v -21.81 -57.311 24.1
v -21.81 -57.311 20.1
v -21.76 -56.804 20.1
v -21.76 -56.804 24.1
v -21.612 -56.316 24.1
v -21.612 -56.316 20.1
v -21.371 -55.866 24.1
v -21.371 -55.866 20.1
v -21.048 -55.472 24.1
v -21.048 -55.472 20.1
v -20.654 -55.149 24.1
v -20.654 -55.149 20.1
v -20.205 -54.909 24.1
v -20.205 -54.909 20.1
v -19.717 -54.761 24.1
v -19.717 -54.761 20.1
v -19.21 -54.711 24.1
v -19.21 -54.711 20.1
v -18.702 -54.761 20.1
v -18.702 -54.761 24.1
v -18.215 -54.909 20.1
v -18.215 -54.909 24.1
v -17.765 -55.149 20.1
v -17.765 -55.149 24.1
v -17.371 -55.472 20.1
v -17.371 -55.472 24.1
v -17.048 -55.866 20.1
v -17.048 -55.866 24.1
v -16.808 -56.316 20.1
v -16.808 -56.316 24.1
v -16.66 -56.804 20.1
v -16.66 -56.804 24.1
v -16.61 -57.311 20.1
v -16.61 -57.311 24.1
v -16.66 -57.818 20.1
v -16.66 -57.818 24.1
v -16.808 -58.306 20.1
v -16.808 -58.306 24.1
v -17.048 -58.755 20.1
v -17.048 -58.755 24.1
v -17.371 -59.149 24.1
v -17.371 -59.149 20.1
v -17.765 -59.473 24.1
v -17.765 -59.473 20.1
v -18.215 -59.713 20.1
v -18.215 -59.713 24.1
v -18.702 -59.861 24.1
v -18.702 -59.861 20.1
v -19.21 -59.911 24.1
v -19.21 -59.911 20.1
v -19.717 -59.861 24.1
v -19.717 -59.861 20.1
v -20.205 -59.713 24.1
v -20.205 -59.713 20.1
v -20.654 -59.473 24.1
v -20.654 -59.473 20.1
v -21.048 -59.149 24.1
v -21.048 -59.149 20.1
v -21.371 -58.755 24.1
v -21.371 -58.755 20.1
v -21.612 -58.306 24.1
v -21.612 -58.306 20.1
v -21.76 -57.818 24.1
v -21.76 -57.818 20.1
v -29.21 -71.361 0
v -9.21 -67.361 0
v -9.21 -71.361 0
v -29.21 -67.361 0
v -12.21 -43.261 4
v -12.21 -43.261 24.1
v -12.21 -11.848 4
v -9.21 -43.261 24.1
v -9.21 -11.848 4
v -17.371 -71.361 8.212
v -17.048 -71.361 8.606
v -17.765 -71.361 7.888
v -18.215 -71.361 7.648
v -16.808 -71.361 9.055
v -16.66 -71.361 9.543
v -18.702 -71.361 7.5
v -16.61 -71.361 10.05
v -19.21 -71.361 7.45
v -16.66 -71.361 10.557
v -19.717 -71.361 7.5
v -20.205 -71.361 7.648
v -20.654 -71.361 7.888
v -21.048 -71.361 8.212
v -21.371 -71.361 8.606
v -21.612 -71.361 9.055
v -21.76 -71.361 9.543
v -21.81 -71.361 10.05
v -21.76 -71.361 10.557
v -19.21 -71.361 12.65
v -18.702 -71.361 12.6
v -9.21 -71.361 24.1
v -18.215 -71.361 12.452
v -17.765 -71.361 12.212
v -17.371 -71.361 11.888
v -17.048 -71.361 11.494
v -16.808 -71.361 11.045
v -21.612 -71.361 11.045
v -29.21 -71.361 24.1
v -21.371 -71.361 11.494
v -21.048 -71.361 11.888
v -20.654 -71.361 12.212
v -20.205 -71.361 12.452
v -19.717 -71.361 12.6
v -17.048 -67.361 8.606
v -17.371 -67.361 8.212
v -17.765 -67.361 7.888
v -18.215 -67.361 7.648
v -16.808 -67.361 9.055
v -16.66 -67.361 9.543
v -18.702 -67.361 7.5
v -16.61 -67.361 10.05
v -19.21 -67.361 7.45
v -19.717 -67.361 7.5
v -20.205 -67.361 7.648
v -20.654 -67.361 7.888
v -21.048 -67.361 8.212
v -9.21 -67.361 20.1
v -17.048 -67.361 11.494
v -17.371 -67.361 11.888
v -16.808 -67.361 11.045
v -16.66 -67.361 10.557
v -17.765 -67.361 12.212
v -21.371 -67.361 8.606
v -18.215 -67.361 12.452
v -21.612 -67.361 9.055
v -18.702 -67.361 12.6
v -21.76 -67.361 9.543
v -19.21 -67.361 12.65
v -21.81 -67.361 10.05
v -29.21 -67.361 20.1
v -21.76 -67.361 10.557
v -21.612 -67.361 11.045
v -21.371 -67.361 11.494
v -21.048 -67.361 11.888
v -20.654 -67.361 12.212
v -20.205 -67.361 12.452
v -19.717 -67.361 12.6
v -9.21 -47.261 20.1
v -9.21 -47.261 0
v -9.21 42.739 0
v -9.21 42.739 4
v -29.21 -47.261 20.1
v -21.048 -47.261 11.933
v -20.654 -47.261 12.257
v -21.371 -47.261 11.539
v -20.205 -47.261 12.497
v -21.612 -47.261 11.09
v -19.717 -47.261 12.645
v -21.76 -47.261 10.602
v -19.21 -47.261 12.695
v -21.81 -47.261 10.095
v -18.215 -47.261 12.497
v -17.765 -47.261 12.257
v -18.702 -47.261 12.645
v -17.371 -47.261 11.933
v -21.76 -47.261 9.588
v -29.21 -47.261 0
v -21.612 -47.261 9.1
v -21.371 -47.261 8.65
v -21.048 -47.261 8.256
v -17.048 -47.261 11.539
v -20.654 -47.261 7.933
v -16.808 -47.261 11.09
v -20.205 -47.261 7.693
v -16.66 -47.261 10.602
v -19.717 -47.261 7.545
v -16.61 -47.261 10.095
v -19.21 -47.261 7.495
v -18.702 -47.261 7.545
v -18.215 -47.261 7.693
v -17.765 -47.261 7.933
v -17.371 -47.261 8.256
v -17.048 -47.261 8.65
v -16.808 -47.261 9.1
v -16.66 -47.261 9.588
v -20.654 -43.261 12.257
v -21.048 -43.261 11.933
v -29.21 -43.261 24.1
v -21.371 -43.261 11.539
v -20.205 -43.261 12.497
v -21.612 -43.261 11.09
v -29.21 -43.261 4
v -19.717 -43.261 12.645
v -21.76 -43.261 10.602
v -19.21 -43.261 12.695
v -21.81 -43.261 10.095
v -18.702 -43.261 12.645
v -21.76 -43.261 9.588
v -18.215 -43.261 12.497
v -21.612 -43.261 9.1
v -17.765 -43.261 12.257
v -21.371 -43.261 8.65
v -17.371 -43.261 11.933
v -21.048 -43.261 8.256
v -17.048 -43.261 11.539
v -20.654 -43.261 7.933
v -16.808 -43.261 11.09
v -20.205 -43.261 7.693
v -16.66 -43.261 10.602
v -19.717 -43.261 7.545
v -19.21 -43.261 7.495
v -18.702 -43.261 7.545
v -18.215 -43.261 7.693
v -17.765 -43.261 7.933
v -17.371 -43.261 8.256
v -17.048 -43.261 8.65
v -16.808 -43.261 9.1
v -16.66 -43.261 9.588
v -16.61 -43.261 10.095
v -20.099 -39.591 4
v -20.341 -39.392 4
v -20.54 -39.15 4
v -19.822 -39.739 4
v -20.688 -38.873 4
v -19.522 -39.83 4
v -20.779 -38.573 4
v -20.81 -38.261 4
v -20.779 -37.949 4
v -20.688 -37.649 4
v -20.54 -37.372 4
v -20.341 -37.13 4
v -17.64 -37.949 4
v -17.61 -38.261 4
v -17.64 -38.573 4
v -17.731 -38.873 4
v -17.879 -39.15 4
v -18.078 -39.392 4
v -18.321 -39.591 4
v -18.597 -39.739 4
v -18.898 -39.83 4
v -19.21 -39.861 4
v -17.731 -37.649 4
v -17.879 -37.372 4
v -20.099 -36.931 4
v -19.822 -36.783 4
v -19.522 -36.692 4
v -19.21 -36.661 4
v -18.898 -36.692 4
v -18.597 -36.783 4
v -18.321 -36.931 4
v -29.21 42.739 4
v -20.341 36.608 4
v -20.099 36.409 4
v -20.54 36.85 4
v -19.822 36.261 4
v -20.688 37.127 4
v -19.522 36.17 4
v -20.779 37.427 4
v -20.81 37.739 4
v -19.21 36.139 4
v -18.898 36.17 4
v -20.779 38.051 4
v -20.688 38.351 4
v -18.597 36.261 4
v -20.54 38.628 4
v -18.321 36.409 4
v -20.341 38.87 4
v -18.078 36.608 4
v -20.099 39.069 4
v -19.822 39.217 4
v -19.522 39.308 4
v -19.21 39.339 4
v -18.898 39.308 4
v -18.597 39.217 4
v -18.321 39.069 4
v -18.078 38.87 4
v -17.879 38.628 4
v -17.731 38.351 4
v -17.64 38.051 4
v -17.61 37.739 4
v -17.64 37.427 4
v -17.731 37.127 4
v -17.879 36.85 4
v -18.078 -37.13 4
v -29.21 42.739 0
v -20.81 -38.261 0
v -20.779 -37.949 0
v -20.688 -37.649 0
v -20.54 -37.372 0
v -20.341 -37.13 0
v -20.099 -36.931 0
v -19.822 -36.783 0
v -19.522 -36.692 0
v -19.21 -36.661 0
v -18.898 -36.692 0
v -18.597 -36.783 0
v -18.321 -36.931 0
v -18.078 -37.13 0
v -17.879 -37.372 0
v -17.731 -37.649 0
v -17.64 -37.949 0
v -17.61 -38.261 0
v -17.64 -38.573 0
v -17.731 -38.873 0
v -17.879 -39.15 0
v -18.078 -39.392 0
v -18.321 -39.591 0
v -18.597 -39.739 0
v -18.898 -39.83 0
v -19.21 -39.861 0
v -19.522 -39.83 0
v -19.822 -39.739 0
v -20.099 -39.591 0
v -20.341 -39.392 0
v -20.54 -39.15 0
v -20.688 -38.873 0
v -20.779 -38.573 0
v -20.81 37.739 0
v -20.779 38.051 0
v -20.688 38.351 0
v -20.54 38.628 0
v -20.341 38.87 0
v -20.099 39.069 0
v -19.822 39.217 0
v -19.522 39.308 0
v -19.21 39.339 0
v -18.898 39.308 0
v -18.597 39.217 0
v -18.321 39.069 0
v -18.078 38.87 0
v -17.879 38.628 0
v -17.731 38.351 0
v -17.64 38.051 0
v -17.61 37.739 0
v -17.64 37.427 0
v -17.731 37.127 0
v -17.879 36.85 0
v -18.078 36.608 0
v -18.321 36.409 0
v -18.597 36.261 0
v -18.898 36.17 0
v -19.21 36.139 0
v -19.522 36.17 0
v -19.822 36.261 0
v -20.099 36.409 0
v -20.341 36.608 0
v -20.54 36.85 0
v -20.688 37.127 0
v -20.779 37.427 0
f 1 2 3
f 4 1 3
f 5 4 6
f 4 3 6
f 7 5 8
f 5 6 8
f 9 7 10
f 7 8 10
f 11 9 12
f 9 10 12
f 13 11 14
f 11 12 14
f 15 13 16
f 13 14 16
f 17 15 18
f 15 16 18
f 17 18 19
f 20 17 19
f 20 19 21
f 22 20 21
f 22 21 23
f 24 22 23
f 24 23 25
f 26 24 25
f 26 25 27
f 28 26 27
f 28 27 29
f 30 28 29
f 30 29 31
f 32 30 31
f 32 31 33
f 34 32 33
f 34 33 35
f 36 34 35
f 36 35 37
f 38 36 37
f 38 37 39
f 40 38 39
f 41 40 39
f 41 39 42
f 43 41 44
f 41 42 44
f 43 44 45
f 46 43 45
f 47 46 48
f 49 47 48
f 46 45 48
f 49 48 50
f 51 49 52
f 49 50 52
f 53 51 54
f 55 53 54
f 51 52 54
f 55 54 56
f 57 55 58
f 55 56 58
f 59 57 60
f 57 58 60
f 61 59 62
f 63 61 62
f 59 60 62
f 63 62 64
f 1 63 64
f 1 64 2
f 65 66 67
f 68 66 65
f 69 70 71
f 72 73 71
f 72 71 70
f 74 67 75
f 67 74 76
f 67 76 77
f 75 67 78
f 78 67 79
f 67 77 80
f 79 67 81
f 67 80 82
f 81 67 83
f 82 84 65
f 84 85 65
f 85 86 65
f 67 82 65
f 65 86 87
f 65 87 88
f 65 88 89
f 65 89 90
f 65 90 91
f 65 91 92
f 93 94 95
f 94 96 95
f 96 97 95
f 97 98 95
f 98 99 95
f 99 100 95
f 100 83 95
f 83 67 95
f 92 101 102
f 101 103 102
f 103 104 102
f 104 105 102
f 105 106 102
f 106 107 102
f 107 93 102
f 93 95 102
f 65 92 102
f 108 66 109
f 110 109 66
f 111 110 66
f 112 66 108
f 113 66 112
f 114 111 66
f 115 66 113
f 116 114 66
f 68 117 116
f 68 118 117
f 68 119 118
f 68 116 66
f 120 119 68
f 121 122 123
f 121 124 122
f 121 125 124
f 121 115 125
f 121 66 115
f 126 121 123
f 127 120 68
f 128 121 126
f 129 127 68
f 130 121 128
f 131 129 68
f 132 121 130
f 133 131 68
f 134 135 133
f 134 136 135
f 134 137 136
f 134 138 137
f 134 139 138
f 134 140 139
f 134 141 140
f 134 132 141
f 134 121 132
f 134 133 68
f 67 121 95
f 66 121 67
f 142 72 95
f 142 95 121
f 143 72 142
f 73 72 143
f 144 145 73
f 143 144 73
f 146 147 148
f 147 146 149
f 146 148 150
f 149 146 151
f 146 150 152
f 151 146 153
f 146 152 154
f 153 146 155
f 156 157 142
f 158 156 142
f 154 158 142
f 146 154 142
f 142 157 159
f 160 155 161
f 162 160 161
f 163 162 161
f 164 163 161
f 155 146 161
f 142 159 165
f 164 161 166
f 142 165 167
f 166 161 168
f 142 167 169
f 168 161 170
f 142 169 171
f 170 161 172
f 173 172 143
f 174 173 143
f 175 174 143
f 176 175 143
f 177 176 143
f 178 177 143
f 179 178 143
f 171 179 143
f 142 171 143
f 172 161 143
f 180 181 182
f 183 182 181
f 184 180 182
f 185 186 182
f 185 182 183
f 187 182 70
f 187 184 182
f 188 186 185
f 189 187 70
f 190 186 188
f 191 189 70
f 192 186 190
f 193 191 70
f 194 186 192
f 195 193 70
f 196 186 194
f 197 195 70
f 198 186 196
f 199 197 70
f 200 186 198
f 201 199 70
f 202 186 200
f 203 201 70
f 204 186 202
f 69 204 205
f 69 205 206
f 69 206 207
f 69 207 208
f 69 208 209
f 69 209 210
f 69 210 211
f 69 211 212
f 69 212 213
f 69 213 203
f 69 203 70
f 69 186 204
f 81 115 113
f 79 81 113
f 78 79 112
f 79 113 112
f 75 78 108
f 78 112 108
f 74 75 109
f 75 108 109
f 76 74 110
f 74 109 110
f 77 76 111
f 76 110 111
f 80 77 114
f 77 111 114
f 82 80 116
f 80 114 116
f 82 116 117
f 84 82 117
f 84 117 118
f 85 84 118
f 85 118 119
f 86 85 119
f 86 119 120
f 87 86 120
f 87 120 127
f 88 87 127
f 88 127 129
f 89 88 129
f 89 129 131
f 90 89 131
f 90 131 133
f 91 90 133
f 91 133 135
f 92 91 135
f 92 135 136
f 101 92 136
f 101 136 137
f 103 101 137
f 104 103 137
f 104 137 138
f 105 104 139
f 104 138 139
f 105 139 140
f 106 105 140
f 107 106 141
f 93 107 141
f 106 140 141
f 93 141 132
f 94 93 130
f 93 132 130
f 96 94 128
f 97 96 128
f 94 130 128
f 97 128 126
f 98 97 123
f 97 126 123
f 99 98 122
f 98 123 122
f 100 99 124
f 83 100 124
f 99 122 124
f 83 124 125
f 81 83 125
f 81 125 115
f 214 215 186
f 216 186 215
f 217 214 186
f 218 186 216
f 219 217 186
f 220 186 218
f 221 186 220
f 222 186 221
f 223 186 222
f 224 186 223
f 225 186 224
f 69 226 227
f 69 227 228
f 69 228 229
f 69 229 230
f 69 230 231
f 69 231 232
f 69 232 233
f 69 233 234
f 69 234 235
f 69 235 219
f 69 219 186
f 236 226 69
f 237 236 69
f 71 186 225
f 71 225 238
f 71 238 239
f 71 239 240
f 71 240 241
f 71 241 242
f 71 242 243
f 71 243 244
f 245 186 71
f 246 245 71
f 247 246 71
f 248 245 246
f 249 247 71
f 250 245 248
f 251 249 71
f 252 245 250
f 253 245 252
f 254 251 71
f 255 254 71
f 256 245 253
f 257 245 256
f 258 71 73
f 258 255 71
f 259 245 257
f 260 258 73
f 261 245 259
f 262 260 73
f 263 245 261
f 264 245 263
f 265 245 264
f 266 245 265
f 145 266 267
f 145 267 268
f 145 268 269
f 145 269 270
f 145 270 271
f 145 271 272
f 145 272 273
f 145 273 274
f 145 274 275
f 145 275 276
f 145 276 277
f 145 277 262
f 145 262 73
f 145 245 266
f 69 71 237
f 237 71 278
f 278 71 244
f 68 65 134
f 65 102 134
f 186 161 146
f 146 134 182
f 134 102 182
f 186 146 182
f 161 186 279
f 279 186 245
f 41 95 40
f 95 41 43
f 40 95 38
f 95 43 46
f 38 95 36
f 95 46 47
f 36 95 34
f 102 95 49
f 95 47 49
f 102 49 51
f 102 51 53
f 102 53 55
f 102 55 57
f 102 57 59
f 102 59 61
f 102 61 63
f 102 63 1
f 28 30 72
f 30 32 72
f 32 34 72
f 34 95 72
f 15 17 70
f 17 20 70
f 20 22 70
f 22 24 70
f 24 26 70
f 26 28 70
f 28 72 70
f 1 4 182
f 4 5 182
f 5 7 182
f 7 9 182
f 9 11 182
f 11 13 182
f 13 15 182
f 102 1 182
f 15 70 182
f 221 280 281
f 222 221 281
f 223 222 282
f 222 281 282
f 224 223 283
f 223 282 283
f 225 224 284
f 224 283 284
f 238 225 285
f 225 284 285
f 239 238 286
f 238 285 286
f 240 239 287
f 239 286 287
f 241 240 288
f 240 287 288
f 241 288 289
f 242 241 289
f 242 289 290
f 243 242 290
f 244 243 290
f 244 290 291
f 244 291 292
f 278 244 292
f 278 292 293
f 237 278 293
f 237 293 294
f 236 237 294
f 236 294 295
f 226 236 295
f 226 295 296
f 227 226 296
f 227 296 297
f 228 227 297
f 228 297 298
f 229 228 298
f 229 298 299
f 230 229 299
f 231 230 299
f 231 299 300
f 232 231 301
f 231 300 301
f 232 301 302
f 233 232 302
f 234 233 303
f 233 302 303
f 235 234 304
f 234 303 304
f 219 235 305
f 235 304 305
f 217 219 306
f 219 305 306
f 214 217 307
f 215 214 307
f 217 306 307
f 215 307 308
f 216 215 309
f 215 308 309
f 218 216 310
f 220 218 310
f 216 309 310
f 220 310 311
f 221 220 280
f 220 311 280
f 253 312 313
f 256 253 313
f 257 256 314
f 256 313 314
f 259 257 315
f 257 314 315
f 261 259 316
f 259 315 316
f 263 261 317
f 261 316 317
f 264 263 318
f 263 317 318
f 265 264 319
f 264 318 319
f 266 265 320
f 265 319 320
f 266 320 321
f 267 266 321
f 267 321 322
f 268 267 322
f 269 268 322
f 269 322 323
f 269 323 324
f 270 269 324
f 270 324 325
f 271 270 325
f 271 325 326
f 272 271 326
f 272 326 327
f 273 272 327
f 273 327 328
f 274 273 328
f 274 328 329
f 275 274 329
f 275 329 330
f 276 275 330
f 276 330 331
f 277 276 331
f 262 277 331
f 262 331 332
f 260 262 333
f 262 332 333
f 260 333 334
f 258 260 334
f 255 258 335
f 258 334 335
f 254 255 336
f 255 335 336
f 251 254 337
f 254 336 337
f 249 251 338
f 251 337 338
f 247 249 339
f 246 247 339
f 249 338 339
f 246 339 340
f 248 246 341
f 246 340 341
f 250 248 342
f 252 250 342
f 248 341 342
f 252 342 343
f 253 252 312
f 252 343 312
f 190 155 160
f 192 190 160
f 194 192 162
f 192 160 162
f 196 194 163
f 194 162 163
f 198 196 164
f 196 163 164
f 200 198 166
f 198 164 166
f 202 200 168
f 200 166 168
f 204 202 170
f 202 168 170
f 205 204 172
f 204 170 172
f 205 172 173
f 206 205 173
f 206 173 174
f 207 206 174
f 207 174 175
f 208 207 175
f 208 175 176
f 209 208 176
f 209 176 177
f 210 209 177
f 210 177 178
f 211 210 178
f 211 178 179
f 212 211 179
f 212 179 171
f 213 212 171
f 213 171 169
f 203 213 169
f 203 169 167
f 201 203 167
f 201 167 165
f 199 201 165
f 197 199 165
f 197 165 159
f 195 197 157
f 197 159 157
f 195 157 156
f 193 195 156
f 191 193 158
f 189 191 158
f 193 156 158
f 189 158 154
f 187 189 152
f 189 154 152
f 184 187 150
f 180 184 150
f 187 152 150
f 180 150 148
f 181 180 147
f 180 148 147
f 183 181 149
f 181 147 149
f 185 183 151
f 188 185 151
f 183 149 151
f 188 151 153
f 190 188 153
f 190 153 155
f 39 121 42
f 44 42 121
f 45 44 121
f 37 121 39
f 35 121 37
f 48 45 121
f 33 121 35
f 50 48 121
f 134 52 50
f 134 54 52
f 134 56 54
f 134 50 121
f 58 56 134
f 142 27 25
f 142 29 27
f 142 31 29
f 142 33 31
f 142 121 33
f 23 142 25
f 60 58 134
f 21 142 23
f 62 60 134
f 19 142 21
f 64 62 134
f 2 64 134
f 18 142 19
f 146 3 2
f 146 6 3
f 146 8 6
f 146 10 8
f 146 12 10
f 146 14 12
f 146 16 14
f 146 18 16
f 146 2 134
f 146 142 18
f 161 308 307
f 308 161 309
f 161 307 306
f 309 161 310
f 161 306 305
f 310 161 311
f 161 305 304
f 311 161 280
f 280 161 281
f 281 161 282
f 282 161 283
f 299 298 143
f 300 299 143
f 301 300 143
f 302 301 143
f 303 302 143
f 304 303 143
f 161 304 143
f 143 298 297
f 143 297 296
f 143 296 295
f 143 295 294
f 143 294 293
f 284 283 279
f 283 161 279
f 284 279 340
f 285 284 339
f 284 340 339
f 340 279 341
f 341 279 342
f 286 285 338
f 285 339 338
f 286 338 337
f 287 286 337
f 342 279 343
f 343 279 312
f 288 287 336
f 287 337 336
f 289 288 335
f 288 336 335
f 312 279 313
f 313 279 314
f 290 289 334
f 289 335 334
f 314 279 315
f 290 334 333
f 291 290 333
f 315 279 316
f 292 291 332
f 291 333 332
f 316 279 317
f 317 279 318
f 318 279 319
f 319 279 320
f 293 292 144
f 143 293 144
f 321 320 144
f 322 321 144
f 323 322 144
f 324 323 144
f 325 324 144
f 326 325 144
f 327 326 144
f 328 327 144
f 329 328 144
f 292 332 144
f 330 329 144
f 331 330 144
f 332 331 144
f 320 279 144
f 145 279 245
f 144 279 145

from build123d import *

# Parameters (mm, degrees)
SKETCH_1_W          = 20
SKETCH_1_H          = 90
EXTRUDE_1_DEPTH     = 4
SKETCH_2_W          = 20
SKETCH_2_H          = 4
EXTRUDE_2_DEPTH     = 20.1
SKETCH_3_W          = 20
SKETCH_3_H          = 4
EXTRUDE_3_DEPTH     = 24.1
SKETCH_4_W          = 20
SKETCH_4_H          = 4
EXTRUDE_4_DEPTH     = 20.1
SKETCH_5_R          = 2.6
CUT_EXTRUDE_1_DEPTH = 20
SKETCH_6_R          = 2.6
CUT_EXTRUDE_2_DEPTH = 20
SKETCH_7_R          = 2.6
CUT_EXTRUDE_3_DEPTH = 20
SKETCH_9_R          = 1.6
CUT_EXTRUDE_4_DEPTH = 20
EXTRUDE_5_DEPTH     = 3


with BuildPart() as part:
    # 草图1 → 凸台-拉伸1 (new body)
    with BuildSketch(Plane.XY):
        with Locations((-19.209677061, -2.260885663)):
            Rectangle(SKETCH_1_W, SKETCH_1_H)
    extrude(amount=EXTRUDE_1_DEPTH)

    # 草图2 → 凸台-拉伸2 (add)
    with BuildSketch(Plane.XY.offset(4)):
        with Locations((-19.209677061, -45.260885663)):
            Rectangle(SKETCH_2_W, SKETCH_2_H)
    extrude(amount=EXTRUDE_2_DEPTH)

    # 草图3 → 凸台-拉伸3 (add)
    with BuildSketch(Plane(origin=(0, -47.260885663, 0), x_dir=(-1, 0, 0), z_dir=(0, -1, 0))):
        with Locations((19.209677061, -22.1)):
            Rectangle(SKETCH_3_W, SKETCH_3_H)
    extrude(amount=EXTRUDE_3_DEPTH)

    # 草图4 → 凸台-拉伸4 (add)
    with BuildSketch(Plane(origin=(0, 0, 20.1), x_dir=(-1, 0, 0), z_dir=(0, 0, -1))):
        with Locations((19.209677061, -69.360885663)):
            Rectangle(SKETCH_4_W, SKETCH_4_H)
    extrude(amount=EXTRUDE_4_DEPTH)

    # 草图5 → 切除-拉伸1 (cut)
    with BuildSketch(Plane(origin=(0, -47.260885663, 0), x_dir=(-1, 0, 0), z_dir=(0, -1, 0))):
        with Locations((19.209677061, -10.094759339)):
            Circle(SKETCH_5_R)
    extrude(amount=-CUT_EXTRUDE_1_DEPTH, mode=Mode.SUBTRACT)

    # 草图6 → 切除-拉伸2 (cut)
    with BuildSketch(Plane(origin=(0, 0, 20.1), x_dir=(-1, 0, 0), z_dir=(0, 0, -1))):
        with Locations((19.209677061, -57.310885663)):
            Circle(SKETCH_6_R)
    extrude(amount=-CUT_EXTRUDE_2_DEPTH, mode=Mode.SUBTRACT)

    # 草图7 → 切除-拉伸3 (cut)
    with BuildSketch(Plane(origin=(0, -67.360885663, 0), x_dir=(1, 0, 0), z_dir=(0, 1, 0))):
        with Locations((-19.209677061, -10.05)):
            Circle(SKETCH_7_R)
    extrude(amount=-CUT_EXTRUDE_3_DEPTH, mode=Mode.SUBTRACT)

    # 草图9 → 切除-拉伸4 (cut)
    with BuildSketch(Plane(origin=(0, 0, 0), x_dir=(-1, 0, 0), z_dir=(0, 0, -1))):
        with Locations((19.209677061, 37.739114337)):
            Circle(SKETCH_9_R)
        with Locations((19.209677061, -38.260885663)):
            Circle(SKETCH_9_R)
    extrude(amount=-CUT_EXTRUDE_4_DEPTH, mode=Mode.SUBTRACT)

    # 草图10 → 凸台-拉伸5 (add)
    with BuildSketch(Plane(origin=(-9.209677061, 0, 0), x_dir=(0, 0, -1), z_dir=(1, 0, 0))):
        Polygon((-4, -11.848280973), (-24.1, -43.260885663), (-4, -43.260885663), align=None)
    extrude(amount=-EXTRUDE_5_DEPTH)


solid = part.part
